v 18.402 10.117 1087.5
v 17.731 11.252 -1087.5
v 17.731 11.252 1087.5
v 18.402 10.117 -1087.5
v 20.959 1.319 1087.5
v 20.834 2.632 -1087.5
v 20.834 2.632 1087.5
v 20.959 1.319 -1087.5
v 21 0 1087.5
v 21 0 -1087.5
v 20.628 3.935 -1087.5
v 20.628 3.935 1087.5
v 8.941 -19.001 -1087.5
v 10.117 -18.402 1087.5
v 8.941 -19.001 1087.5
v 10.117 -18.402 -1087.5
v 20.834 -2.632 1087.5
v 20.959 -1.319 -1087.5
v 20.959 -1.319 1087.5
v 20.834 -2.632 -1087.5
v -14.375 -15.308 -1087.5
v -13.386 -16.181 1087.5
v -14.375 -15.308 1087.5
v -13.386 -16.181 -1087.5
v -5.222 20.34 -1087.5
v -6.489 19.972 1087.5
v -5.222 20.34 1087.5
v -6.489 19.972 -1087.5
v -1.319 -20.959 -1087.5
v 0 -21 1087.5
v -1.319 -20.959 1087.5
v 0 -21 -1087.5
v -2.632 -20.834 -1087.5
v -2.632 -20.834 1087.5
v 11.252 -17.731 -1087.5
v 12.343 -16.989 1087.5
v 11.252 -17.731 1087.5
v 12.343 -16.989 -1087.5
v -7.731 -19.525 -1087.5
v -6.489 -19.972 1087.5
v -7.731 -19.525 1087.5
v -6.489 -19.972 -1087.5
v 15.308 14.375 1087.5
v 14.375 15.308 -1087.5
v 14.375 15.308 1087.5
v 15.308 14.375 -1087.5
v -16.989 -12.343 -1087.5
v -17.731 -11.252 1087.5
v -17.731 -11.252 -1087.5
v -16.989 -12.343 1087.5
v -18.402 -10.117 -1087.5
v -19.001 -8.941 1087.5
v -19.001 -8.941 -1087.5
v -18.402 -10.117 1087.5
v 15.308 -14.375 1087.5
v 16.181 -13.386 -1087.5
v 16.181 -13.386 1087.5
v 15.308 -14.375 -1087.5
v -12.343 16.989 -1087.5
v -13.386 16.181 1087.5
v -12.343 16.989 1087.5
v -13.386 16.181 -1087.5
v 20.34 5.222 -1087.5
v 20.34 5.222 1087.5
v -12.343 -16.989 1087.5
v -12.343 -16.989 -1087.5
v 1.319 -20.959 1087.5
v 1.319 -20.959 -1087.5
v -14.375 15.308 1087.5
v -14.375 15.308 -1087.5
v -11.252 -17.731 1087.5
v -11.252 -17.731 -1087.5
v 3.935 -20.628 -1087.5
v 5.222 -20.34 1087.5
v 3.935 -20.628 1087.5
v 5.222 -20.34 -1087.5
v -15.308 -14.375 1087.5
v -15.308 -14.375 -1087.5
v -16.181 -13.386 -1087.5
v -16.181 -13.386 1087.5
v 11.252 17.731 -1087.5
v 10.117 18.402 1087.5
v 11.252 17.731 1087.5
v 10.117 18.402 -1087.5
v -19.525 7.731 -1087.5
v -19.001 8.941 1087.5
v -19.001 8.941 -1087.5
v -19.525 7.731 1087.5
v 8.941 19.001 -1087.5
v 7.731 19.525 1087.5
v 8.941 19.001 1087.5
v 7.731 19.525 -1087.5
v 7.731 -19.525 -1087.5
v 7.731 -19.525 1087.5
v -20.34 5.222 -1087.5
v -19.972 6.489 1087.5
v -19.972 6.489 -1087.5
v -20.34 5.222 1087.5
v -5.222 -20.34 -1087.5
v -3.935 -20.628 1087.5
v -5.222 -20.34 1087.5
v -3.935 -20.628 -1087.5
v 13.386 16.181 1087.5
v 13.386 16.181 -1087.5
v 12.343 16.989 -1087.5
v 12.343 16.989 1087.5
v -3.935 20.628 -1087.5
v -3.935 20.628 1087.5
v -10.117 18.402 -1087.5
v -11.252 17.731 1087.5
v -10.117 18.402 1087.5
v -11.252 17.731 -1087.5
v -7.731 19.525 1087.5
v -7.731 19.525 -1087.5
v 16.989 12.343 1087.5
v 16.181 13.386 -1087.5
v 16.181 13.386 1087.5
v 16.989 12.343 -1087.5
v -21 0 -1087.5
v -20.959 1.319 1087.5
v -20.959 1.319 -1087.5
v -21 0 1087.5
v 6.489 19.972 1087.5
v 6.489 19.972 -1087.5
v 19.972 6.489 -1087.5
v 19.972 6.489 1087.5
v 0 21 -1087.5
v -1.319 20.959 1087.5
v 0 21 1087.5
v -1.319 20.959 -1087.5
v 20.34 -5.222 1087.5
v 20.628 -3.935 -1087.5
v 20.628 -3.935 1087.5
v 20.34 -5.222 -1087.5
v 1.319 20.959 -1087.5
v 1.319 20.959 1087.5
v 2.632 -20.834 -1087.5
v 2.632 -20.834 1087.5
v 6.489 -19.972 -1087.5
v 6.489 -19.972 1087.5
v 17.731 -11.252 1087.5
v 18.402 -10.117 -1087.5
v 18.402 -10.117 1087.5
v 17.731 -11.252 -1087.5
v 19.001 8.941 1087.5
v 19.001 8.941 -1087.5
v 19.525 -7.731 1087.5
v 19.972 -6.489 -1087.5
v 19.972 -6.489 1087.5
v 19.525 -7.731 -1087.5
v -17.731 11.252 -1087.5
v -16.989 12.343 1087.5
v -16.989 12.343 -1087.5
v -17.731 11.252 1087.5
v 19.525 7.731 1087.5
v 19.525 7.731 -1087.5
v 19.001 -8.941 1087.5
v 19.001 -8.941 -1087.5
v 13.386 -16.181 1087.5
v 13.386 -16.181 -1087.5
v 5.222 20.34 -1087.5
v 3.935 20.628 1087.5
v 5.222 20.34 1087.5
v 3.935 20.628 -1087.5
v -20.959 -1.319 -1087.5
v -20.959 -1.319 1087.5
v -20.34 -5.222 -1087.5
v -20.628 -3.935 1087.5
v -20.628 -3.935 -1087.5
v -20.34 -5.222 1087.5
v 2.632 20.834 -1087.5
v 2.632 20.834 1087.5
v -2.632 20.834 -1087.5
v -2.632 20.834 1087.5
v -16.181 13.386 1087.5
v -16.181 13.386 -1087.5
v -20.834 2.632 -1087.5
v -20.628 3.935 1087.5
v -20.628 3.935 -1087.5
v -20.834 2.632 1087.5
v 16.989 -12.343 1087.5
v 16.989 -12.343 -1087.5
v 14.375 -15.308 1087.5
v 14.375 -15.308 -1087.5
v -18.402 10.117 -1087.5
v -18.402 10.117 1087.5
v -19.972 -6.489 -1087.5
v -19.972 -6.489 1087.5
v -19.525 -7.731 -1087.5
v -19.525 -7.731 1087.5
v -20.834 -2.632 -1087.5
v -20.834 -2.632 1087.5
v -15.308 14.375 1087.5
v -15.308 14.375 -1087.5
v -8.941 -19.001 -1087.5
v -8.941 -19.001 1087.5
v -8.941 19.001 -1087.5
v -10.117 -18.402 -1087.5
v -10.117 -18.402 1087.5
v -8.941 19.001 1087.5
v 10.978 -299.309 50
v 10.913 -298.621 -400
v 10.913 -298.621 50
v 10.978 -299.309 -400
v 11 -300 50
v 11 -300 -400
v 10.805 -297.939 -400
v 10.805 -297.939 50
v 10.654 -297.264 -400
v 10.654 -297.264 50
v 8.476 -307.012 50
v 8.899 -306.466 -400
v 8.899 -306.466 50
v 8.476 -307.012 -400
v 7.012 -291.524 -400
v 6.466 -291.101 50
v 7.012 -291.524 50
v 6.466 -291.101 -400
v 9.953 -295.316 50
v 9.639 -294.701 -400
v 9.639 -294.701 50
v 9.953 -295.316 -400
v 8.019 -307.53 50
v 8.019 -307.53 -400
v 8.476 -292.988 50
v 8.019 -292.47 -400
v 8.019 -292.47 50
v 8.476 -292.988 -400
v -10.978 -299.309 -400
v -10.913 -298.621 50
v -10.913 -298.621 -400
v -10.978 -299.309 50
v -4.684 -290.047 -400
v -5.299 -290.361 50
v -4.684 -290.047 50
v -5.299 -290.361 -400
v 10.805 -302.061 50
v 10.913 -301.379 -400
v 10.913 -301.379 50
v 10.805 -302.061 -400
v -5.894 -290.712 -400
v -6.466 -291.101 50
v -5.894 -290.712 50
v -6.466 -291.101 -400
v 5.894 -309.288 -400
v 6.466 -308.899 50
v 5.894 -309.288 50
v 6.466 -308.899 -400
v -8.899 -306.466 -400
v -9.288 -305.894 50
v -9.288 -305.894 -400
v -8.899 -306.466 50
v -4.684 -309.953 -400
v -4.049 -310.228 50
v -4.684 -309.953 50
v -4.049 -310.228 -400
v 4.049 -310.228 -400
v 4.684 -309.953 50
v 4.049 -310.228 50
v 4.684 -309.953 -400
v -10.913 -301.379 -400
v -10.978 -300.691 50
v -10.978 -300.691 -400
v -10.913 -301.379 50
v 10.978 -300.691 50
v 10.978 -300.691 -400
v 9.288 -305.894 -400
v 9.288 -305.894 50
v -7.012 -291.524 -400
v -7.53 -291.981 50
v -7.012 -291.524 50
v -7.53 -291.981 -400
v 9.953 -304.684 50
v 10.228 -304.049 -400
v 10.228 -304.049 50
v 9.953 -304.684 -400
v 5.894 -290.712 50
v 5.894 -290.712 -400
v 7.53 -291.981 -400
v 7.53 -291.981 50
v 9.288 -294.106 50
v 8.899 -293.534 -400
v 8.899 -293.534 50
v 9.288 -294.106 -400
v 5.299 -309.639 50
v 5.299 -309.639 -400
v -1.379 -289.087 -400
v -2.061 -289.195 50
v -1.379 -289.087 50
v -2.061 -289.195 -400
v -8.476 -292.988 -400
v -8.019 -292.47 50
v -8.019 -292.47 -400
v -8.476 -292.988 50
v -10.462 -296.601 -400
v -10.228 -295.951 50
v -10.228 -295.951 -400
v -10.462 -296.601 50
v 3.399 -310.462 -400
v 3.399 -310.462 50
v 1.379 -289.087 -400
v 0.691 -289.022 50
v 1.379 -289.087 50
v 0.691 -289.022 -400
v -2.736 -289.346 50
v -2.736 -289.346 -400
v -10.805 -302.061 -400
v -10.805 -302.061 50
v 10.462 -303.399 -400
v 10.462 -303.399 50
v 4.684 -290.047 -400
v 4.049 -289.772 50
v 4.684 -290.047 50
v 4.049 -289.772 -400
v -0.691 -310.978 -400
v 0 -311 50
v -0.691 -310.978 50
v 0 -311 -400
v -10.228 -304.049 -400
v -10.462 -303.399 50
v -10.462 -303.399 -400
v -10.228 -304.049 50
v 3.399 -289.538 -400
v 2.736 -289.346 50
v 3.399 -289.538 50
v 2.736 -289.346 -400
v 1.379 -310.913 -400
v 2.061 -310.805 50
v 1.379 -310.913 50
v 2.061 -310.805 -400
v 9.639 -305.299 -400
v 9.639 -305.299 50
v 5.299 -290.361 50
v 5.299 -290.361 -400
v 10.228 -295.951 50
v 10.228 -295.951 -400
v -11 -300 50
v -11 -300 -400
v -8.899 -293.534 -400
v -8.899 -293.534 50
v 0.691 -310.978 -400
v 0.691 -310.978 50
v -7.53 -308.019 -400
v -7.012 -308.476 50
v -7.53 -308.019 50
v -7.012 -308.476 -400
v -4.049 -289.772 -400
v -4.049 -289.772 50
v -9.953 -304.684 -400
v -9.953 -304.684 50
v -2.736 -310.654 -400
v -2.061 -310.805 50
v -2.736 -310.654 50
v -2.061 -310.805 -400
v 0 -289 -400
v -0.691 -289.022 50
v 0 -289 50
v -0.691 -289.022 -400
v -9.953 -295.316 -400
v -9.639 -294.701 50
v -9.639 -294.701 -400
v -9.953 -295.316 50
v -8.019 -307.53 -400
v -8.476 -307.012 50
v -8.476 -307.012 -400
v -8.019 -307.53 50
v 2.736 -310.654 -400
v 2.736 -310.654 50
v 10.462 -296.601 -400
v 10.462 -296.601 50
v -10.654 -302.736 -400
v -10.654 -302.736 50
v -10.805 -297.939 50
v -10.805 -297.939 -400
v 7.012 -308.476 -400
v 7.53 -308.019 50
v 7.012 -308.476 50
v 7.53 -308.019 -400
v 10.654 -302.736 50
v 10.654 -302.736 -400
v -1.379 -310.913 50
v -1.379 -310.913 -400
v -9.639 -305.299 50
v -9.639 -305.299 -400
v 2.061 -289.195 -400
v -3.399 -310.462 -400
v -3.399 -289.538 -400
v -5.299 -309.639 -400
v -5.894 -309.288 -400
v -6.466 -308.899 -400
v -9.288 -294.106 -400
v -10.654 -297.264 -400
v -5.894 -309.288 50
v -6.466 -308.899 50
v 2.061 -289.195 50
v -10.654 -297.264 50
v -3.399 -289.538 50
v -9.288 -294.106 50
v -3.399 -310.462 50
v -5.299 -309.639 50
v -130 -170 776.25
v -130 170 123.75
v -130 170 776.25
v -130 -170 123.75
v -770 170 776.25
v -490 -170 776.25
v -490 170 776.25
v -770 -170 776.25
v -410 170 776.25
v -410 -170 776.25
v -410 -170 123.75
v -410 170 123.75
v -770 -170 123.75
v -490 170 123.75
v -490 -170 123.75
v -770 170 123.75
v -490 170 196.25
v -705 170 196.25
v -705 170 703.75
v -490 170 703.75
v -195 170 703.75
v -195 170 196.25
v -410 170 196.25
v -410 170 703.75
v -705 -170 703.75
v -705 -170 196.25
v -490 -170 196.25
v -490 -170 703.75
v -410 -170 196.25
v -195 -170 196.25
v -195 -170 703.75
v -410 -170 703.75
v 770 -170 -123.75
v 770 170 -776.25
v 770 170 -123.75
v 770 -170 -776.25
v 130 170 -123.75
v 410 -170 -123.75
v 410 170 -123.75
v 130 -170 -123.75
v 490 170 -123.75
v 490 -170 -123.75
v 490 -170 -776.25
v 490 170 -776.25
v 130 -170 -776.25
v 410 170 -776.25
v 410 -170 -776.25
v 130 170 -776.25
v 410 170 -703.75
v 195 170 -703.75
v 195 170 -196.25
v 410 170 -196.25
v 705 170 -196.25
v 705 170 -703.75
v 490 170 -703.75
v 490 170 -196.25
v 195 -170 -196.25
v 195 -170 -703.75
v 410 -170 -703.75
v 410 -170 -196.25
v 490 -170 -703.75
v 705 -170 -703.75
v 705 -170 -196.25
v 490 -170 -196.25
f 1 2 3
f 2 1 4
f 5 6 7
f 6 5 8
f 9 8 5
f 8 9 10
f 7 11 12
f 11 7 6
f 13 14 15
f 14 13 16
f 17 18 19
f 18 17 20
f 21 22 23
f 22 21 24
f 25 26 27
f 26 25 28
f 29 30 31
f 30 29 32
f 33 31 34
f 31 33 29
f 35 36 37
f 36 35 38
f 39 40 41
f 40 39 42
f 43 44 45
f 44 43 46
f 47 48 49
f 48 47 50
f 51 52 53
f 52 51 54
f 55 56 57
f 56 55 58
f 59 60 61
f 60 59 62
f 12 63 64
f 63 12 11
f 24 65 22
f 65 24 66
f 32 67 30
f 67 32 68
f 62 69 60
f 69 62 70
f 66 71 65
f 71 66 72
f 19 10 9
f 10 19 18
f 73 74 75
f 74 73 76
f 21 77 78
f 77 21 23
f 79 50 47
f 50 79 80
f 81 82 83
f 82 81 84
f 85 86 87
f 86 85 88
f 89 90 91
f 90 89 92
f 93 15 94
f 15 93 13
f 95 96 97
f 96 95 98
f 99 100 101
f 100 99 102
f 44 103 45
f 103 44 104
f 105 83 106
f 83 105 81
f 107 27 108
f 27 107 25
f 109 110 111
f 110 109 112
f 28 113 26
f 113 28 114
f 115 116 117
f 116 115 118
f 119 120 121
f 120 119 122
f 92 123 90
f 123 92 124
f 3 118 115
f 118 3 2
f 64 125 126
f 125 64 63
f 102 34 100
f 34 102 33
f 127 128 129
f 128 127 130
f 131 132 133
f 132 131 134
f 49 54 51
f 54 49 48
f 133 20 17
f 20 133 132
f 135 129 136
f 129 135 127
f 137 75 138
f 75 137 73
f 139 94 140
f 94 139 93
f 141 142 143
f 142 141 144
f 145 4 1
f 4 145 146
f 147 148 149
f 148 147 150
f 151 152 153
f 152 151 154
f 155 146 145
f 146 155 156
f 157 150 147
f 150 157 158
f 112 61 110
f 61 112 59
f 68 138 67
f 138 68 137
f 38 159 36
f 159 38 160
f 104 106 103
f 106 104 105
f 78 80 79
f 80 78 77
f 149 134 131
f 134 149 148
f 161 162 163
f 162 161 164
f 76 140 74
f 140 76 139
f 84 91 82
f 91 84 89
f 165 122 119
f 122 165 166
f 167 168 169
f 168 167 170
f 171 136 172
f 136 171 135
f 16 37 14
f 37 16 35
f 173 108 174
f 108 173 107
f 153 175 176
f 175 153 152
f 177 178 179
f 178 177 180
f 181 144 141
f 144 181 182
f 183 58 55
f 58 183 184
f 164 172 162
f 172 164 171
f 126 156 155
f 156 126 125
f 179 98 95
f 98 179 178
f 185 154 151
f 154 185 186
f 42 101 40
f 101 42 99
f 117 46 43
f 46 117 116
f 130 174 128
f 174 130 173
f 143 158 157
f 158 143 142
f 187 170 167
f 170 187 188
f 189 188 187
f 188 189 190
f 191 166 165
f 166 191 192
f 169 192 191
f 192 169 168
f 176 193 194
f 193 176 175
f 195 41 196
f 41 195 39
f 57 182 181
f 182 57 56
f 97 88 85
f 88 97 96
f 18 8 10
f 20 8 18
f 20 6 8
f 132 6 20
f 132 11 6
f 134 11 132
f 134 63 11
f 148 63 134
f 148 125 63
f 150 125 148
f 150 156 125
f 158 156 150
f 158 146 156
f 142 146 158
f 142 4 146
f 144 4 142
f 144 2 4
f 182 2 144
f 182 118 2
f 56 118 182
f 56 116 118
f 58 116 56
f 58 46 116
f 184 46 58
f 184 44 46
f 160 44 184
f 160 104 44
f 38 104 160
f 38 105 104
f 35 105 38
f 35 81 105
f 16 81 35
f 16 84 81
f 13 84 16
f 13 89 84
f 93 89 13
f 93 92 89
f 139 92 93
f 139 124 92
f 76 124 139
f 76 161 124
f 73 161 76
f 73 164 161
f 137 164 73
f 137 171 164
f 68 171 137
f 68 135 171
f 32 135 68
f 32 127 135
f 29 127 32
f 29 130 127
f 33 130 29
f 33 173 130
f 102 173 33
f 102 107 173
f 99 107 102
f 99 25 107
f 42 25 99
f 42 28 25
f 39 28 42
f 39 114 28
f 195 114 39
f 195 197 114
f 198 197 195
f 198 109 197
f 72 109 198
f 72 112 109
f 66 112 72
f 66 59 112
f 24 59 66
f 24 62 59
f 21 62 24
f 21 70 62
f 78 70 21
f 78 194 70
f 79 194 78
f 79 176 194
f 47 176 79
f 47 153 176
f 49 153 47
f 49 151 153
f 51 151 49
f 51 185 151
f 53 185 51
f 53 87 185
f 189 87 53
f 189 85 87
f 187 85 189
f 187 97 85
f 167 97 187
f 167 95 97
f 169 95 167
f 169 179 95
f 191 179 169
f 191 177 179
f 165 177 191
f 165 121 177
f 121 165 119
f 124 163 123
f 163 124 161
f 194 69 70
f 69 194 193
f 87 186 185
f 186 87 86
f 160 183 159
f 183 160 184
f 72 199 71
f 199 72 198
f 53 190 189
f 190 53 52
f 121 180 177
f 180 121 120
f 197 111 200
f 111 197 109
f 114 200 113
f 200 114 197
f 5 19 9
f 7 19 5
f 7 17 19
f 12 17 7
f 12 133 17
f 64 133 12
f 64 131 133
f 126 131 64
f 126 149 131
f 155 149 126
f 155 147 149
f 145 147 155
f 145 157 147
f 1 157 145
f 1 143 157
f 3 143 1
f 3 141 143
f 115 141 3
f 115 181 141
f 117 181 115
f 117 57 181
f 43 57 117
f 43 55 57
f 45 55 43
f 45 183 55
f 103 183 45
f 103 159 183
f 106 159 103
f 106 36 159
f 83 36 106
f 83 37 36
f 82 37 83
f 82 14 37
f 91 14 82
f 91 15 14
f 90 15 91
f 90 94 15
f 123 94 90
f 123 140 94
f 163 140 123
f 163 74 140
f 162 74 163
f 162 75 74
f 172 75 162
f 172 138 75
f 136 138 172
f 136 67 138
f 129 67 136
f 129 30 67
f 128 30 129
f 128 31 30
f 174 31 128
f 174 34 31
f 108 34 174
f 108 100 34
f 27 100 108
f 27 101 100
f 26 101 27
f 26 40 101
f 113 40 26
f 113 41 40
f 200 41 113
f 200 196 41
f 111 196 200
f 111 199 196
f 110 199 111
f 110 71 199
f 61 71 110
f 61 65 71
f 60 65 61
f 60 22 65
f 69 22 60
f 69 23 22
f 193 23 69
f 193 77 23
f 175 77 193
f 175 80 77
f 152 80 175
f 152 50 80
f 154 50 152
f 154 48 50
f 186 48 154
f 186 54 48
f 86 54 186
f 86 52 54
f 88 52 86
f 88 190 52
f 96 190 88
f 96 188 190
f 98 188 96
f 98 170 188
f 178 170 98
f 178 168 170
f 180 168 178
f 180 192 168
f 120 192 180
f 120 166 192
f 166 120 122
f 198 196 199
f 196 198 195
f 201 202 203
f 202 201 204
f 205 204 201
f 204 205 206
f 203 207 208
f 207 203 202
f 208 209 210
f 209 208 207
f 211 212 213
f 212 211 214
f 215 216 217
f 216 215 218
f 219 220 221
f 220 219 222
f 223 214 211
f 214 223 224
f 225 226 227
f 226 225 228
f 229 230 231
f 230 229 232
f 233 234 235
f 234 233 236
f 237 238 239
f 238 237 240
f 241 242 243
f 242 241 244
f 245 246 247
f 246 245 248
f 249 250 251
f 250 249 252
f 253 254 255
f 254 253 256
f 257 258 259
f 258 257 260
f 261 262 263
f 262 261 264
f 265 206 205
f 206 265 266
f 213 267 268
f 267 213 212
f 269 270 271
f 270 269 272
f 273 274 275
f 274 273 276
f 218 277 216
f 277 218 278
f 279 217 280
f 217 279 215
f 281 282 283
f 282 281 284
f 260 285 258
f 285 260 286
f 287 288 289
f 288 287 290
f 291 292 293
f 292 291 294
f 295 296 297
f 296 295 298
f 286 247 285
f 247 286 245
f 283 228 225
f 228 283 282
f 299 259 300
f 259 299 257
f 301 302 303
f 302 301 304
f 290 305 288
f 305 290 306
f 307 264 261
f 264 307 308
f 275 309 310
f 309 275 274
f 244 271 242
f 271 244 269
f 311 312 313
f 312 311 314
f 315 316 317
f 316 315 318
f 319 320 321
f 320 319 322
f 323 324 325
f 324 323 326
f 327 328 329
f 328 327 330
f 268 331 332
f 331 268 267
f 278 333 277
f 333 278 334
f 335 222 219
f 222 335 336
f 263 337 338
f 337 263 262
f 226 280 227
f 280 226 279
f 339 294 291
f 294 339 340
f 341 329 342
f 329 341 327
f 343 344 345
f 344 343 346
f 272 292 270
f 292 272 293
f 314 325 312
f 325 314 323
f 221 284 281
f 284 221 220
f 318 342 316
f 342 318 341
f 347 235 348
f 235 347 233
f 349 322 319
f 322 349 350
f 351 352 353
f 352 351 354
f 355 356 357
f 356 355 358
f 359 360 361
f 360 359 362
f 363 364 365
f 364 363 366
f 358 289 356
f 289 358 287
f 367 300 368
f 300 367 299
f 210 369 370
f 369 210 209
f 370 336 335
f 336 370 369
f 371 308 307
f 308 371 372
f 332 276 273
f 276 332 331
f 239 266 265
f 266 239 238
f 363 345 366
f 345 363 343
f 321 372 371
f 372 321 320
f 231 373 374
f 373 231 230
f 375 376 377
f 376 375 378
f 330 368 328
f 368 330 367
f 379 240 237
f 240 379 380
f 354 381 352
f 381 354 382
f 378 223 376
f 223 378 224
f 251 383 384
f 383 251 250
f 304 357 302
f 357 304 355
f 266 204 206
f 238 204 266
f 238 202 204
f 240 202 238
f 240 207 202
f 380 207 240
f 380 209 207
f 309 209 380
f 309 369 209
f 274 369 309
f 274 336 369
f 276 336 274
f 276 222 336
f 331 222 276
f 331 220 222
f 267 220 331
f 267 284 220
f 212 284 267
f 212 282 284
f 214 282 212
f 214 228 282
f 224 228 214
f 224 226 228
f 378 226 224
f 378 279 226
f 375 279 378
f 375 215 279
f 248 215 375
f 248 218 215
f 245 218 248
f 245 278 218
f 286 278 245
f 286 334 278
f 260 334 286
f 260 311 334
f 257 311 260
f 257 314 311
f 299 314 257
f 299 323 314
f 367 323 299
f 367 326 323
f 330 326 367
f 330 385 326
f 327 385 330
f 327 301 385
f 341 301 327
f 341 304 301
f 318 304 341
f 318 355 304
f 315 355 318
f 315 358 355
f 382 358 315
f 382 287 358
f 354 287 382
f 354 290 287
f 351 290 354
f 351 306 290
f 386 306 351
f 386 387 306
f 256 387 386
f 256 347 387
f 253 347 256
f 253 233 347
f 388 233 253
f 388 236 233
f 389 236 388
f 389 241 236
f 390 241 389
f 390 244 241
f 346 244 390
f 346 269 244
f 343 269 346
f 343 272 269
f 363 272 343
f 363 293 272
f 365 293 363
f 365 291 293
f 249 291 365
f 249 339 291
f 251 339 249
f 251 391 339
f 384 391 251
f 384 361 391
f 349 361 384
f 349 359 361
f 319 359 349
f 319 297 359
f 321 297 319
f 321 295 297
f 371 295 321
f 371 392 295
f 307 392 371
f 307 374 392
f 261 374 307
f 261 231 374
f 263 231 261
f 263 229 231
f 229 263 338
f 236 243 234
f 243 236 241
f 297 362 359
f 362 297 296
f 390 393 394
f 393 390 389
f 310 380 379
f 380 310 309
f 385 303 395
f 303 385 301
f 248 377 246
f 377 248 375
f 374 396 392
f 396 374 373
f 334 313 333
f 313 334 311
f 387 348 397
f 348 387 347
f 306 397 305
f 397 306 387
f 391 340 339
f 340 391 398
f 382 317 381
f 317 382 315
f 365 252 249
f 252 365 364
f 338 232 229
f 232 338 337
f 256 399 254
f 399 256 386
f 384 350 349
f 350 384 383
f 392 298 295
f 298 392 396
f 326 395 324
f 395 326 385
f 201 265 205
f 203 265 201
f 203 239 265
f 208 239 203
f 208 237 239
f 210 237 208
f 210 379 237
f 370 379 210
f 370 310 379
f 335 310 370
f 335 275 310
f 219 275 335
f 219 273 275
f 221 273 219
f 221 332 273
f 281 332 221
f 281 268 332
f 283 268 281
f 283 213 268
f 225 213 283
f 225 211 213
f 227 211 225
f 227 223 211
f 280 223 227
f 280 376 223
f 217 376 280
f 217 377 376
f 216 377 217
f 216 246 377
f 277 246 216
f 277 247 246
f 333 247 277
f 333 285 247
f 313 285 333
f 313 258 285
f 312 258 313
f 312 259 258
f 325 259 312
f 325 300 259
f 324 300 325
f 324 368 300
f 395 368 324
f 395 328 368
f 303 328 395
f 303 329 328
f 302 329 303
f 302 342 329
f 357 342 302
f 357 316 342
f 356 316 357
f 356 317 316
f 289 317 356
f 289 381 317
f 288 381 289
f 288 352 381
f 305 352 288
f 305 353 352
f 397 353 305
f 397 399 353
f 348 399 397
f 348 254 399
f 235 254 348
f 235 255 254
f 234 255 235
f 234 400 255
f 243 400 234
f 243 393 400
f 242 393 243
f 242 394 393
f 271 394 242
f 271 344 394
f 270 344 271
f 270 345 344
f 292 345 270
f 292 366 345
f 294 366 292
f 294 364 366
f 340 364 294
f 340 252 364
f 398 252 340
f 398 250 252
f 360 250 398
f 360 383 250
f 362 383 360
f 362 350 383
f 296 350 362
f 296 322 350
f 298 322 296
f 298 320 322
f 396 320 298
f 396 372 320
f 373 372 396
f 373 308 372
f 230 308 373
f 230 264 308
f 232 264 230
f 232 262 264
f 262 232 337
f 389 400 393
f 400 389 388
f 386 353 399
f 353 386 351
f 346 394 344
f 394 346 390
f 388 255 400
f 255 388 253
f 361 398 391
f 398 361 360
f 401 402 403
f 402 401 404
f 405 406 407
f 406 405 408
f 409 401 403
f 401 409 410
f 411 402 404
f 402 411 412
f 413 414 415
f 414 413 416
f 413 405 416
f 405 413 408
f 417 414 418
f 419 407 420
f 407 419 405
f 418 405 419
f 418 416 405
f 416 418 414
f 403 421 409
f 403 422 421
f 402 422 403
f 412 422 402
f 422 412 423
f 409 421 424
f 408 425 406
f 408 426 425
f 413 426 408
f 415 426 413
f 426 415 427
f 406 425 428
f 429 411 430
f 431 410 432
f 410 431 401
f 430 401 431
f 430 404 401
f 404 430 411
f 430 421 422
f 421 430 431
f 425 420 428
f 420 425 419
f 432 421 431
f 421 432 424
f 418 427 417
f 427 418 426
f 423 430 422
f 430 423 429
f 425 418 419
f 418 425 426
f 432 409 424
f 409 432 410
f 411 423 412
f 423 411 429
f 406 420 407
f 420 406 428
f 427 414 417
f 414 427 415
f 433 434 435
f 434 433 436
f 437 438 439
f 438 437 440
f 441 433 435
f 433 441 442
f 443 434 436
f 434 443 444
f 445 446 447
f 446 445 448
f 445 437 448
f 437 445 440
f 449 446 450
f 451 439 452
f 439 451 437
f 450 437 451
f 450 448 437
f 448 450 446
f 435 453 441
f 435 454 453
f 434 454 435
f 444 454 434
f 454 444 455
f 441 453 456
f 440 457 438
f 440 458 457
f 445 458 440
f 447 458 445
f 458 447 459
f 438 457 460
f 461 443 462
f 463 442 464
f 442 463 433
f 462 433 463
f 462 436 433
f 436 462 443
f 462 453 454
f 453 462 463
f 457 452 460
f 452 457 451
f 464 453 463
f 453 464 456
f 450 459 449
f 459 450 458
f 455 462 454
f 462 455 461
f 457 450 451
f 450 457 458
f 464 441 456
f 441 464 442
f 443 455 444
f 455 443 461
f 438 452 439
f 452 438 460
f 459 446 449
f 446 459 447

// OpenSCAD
// ============================================================================
// PROJECT: XXXG-00W0 WING GUNDAM ZERO EW - TORSO INNER BACKBONE INFRA
// COMPONENT VAULT: BANDAI CAST RUNNER G - THORACIC FRAMES G1 & G2
// PACKAGING RE-ARCHITECTURE: SUB-ARMOR CAPACITOR RECESSED BANK INTEGRATION
// CONFIG METRIC: SCALED TITANIUM CASTS (1:1 ACTUAL METRIC UP-SCALE)
// ============================================================================

$fn = 100; // High-precision circular resolution segment count

// Structural Constants Scaled 1:1 for a 16.7-Meter Airframe Scale (mm)
core_total_length = 1450;                // Total longitudinal vertical spine block height (mm)
core_base_width = 640;                  // Maximum width of base thoracic frame anchor (mm)
armor_skin_thickness = 65;              // Solid TiAl protective plating wall (mm)
harness_conduit_width = 80;             // Cast-in 4oz copper logic trace track (mm)
capacitor_pocket_depth = 15;            // Sub-armor recessed housing pocket depth (mm)
capacitor_pocket_width = 140;           // Transverse MLCC array pocket width (mm)

module Runner_G_Thoracic_Core_Forge() {
    // Central Supply Injection Runner Axis (Molten Feed Line from Siphon Forge)
    color([0.22, 0.22, 0.25]) {
        cylinder(h = core_total_length * 1.5, d = 42, center = true);
        // Direct injection gates tracking straight into the part mold cavities
        translate() rotate() cylinder(h = 450, d = 22);
        translate([0, -300, -400]) rotate() cylinder(h = 450, d = 22);
    }
    
    // Instantiate Scaled Skeutomorphic Part Molds Symmetrically (Left & Right)
    Cast_Internal_Thoracic_Frames();
}

module Cast_Internal_Thoracic_Frames() {
    // ---- PART G1: INTERNAL LEFT UPPER THORACIC CHEST CORE FRAME ----
    translate([-450, 0, 450]) color([0.35, 0.35, 0.38]) { // Inner Frame Dark Spec
        difference() {
            // Main solid heavy-duty thoracic framework structure block segment
            cube([core_base_width, 340, core_total_length * 0.45], center = true);
            
            // Core structural cutout for trailing collar ring guide rails alignment
            cube([core_base_width - (armor_skin_thickness * 2), 360, core_total_length * 0.35], center = true);
            
            // SUB-ARMOR RECESSED CAPACITOR POCKETS [Segmented rows cut inside the frame walls]
            for (z_offset = [-200, 0, 200]) {
                translate([(core_base_width * 0.25 - armor_skin_thickness + capacitor_pocket_depth/2), 0, z_offset])
                    cube([capacitor_pocket_depth, capacitor_pocket_width, 100], center = true);
            }
            
            // Continuous cast-in routing track for the 4oz solid-state wiring rails
            cube([harness_conduit_width, 360, core_total_length], center = true);
        }
    }
    
    // ---- PART G2: INTERNAL RIGHT UPPER THORACIC CHEST CORE FRAME ----
    translate([450, 0, -450]) rotate() color([0.35, 0.35, 0.38]) {
        difference() {
            cube([core_base_width, 340, core_total_length * 0.45], center = true);
            cube([core_base_width - (armor_skin_thickness * 2), 360, core_total_length * 0.35], center = true);
            
            for (z_offset = [-200, 0, 200]) {
                translate([(core_base_width * 0.25 - armor_skin_thickness + capacitor_pocket_depth/2), 0, z_offset])
                    cube([capacitor_pocket_width, capacitor_pocket_depth, 100], center = true);
            }
            
            cube([harness_conduit_width, 360, core_total_length], center = true);
        }
    }
}

// Render Master Assembly to Parameter Workspace
Runner_G_Thoracic_Core_Forge();
